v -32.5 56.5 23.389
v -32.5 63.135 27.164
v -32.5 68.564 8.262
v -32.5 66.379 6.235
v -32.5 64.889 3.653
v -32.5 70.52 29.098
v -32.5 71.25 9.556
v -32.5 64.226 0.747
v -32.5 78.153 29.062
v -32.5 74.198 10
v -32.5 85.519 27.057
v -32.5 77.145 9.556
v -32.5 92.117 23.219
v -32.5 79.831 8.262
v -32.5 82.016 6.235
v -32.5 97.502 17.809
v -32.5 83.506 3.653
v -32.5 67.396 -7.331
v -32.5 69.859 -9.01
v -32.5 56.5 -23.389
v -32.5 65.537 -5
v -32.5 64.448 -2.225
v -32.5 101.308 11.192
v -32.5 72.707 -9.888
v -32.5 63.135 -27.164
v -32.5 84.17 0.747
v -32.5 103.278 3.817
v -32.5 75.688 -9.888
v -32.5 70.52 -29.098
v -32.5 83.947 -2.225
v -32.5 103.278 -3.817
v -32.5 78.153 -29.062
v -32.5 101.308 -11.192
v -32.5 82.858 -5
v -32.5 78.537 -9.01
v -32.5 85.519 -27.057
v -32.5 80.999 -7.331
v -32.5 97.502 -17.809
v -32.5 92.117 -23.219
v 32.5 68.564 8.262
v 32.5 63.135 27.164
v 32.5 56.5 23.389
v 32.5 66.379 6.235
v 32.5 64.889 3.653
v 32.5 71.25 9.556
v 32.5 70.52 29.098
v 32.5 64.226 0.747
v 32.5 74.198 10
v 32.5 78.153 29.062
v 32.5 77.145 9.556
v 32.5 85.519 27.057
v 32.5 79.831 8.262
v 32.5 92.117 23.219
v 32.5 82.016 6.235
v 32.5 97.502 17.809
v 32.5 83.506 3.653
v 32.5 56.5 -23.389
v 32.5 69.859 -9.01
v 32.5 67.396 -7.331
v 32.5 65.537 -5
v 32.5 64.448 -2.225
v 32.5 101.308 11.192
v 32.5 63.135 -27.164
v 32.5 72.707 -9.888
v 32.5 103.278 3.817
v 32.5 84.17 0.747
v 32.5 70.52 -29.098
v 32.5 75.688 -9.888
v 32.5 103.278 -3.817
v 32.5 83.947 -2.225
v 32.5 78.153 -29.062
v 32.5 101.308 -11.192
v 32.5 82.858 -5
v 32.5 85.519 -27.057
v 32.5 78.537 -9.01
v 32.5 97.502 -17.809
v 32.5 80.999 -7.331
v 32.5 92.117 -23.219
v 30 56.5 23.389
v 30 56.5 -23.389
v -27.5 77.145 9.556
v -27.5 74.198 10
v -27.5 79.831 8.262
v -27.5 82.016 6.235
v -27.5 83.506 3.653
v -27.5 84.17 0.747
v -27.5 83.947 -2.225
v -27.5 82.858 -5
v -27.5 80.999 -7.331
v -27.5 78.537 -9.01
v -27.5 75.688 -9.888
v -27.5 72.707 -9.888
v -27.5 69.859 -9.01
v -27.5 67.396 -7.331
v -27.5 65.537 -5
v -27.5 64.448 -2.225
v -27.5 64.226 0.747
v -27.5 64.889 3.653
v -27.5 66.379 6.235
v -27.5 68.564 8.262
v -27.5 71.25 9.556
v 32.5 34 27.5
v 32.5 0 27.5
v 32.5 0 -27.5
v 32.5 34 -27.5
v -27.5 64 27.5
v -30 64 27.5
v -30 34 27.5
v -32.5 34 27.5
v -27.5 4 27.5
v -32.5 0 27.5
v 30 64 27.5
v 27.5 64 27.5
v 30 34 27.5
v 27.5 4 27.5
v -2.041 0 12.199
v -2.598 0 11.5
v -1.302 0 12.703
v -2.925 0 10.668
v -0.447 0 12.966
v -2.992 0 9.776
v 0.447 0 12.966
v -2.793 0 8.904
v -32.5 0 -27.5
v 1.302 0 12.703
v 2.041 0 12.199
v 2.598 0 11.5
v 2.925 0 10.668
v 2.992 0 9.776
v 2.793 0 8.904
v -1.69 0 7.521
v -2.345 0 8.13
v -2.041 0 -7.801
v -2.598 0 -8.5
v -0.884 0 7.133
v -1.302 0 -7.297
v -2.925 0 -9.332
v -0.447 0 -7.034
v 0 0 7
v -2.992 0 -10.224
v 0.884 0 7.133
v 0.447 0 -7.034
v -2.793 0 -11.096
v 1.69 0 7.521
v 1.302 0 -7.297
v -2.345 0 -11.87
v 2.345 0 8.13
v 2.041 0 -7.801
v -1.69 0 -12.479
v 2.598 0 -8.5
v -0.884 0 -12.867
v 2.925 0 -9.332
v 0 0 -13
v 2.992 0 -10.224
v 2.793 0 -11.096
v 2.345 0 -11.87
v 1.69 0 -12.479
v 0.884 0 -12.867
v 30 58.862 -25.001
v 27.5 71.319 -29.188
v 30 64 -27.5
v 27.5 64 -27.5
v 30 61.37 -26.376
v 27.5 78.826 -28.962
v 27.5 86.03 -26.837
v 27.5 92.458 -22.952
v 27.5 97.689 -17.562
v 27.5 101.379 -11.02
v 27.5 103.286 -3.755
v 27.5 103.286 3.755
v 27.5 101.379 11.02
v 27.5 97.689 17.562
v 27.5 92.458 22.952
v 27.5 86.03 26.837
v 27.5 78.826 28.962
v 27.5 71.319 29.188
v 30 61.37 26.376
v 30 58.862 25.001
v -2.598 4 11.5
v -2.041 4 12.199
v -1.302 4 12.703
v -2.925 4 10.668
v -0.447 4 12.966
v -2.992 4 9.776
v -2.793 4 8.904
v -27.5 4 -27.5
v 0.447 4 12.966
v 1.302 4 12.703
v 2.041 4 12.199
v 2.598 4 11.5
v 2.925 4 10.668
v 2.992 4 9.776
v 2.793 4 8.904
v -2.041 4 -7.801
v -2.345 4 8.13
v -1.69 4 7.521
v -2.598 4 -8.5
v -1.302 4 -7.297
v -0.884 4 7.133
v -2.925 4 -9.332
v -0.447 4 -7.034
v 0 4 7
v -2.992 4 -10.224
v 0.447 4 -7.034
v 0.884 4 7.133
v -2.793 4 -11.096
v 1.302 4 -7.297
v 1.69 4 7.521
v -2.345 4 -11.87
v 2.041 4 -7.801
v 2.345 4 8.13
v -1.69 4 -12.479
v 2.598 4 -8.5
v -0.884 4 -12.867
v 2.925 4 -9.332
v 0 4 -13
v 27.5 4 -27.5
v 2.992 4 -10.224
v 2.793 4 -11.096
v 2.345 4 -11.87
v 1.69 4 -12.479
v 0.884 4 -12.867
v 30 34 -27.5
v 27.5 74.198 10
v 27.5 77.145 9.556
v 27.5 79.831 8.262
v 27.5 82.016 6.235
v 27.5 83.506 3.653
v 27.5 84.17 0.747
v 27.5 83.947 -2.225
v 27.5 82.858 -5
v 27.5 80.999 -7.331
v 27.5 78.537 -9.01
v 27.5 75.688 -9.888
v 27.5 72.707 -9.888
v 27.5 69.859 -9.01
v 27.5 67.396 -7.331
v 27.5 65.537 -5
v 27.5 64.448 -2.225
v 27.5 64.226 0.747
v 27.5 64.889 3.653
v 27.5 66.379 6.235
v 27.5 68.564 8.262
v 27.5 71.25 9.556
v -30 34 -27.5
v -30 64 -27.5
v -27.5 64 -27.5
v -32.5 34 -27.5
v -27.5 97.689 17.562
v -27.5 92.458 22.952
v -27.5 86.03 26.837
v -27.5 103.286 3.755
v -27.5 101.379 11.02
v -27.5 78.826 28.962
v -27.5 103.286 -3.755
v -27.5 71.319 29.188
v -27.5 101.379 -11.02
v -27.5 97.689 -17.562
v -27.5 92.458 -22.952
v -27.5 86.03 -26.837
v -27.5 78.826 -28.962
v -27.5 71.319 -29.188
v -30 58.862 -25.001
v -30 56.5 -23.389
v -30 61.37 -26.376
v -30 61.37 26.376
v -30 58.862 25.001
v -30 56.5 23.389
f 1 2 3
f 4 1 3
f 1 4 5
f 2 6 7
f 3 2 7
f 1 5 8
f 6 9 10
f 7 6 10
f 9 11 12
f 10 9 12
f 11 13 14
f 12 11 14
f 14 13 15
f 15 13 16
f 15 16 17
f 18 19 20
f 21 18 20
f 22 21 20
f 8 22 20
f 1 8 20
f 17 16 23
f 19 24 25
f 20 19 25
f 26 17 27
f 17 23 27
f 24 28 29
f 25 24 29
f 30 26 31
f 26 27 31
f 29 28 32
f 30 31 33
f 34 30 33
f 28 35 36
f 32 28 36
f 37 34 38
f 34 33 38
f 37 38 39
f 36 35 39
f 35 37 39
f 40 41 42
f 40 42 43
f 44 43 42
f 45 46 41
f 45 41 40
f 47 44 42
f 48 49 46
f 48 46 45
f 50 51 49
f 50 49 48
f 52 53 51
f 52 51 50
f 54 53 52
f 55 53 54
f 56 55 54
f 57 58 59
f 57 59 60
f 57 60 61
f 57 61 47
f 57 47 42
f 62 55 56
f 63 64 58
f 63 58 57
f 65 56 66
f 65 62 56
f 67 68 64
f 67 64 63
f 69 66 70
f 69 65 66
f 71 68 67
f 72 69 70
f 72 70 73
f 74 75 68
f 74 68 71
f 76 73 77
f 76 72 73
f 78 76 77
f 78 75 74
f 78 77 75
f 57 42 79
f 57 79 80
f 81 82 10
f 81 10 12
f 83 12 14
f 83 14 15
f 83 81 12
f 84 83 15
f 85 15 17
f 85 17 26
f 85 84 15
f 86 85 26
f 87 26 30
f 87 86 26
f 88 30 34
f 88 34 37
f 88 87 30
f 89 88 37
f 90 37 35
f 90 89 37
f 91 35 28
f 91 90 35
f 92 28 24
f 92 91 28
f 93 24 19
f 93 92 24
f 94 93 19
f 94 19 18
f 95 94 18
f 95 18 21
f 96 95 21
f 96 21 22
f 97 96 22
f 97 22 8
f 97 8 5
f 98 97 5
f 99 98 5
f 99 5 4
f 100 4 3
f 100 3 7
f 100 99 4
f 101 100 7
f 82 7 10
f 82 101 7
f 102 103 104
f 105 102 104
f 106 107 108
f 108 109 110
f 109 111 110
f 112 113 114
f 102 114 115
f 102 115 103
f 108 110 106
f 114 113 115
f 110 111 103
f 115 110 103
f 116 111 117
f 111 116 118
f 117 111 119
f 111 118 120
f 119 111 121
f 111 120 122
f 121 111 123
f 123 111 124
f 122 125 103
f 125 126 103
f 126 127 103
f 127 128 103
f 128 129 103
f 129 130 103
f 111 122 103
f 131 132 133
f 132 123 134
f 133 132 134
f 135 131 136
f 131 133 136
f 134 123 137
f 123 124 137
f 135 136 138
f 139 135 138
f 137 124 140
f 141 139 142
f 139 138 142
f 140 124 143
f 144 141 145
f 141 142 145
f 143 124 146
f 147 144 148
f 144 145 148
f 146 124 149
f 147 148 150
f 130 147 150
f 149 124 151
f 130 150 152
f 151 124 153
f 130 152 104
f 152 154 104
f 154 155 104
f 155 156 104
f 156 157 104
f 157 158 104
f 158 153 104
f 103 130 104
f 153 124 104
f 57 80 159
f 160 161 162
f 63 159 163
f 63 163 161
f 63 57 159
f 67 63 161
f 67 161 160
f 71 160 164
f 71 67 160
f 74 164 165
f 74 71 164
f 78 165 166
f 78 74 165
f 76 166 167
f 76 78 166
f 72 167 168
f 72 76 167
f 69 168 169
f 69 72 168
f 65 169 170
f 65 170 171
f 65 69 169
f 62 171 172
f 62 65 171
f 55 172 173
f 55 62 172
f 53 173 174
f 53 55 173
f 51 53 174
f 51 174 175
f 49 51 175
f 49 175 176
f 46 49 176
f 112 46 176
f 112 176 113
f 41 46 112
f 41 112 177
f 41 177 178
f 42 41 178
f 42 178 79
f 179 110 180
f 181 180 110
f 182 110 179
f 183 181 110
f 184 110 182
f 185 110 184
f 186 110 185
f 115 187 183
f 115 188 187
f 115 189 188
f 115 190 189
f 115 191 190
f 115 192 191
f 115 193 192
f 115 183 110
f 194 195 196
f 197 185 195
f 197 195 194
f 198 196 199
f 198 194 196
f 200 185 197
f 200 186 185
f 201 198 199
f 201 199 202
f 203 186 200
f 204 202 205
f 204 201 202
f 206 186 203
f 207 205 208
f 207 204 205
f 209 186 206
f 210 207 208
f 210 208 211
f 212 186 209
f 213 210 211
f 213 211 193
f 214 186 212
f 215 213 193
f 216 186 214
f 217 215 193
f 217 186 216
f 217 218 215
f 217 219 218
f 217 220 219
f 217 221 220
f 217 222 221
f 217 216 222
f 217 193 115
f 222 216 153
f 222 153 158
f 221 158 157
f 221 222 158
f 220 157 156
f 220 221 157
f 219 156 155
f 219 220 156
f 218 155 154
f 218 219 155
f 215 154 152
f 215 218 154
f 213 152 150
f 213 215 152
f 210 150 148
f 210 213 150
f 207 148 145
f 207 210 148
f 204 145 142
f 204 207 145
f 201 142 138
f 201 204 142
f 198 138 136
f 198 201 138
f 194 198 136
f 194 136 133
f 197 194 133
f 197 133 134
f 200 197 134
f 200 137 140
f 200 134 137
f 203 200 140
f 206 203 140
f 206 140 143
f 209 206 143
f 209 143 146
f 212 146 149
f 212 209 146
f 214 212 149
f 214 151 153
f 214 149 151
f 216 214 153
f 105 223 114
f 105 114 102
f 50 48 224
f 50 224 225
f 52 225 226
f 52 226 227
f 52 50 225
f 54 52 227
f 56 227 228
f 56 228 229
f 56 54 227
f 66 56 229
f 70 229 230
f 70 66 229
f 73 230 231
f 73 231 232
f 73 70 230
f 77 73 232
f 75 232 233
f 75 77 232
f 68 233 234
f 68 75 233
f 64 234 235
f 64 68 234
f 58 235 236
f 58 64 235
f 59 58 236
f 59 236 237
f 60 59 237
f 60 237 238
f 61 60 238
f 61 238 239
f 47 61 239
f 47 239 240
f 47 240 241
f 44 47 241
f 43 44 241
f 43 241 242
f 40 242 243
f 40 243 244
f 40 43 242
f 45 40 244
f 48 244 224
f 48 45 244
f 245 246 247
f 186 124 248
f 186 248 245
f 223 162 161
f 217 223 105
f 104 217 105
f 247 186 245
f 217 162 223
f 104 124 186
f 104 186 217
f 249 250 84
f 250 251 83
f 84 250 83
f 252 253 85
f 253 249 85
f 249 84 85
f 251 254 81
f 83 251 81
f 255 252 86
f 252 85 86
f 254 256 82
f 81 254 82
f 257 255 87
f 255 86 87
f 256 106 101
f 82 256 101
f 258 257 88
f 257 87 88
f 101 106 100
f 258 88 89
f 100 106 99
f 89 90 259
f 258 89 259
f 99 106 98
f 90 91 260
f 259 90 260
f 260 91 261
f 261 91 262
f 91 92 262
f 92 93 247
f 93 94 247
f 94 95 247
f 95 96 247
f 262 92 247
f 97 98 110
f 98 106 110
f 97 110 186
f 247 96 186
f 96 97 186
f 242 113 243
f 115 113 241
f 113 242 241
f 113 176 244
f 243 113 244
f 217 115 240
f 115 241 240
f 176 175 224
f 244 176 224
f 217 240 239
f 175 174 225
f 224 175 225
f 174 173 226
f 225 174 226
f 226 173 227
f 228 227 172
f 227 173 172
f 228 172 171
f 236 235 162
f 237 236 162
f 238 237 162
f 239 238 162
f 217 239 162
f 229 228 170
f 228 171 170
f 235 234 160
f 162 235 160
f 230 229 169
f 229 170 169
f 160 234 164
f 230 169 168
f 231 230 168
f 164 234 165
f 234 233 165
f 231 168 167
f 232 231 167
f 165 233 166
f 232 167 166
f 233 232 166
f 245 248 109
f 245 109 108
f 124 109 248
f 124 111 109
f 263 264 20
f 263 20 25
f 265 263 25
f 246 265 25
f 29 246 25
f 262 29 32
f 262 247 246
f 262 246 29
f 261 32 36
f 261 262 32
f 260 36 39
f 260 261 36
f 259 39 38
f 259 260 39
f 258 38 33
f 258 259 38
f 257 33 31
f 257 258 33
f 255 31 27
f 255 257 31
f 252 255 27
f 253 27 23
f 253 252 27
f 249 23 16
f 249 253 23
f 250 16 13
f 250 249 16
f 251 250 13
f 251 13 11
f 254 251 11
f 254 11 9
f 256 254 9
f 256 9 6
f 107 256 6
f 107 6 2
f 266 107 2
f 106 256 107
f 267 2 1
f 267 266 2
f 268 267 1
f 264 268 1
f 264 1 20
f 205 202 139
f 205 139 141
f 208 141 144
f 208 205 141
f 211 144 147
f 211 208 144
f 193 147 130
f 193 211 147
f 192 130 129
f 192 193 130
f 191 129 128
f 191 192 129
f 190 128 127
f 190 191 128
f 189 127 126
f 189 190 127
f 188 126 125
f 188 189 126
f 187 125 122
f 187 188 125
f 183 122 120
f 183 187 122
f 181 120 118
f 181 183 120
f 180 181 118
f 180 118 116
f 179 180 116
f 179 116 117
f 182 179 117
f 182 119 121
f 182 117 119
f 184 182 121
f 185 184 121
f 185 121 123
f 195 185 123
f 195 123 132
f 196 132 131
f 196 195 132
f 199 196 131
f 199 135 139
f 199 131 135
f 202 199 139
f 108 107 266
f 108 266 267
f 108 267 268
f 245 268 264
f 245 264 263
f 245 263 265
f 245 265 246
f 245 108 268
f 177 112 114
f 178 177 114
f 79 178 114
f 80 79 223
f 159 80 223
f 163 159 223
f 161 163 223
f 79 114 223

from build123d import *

# Parameters (mm, degrees)
SKETCH1_W                = 65
SKETCH1_H                = 55
BOSS_EXTRUDE1_DEPTH      = 4
SKETCH2_W                = 2.5
SKETCH2_H                = 55
BOSS_EXTRUDE2_DEPTH      = 60
SKETCH2_3_W              = 2.5
SKETCH2_3_H              = 55
BOSS_EXTRUDE3_DEPTH      = 30
BOSS_EXTRUDE4_DEPTH      = 2.5
BOSS_EXTRUDE4_DEPTH_BACK = 2.5
SKETCH4_R                = 10
BOSS_EXTRUDE5_START      = -62.5
SKETCH4_2_R              = 10
BOSS_EXTRUDE5_DEPTH      = 5
CUT_EXTRUDE1_DEPTH       = 113.403083271
CUT_EXTRUDE1_DEPTH_BACK  = 113.403083271
SKETCH5_R                = 3


with BuildPart() as part:
    # Sketch1 → Boss-Extrude1 (new body)
    with BuildSketch(Plane(origin=(0, 0, 0), x_dir=(1, 0, 0), z_dir=(0, 1, 0))):
        Rectangle(SKETCH1_W, SKETCH1_H)
    extrude(amount=BOSS_EXTRUDE1_DEPTH)

    # Sketch2 → Boss-Extrude2 (add)
    with BuildSketch(Plane(origin=(0, 4, 0), x_dir=(1, 0, 0), z_dir=(0, 1, 0))):
        with Locations((-28.75, 0)):
            Rectangle(SKETCH2_W, SKETCH2_H)
        with Locations((28.75, 0)):
            Rectangle(SKETCH2_W, SKETCH2_H)
    extrude(amount=BOSS_EXTRUDE2_DEPTH)

    # Sketch2<3> → Boss-Extrude3 (add)
    with BuildSketch(Plane(origin=(0, 4, 0), x_dir=(1, 0, 0), z_dir=(0, 1, 0))):
        with Locations((-31.25, 0)):
            Rectangle(SKETCH2_3_W, SKETCH2_3_H)
        with Locations((31.25, 0)):
            Rectangle(SKETCH2_3_W, SKETCH2_3_H)
    extrude(amount=BOSS_EXTRUDE3_DEPTH)

    # Sketch4 → Boss-Extrude4 (add, two sides: drawn at the far end of the back side and taken through both)
    with BuildSketch(Plane.ZY.offset(30).offset(-BOSS_EXTRUDE4_DEPTH_BACK)):
        with BuildLine():
            Line((23.388987302, 56.500283138), (-23.388987302, 56.500283138))
            ThreePointArc((-23.388987302, 56.500283138), (0, 103.527582425), (23.388987302, 56.500283138))
        make_face()
        with Locations((0, 74.19768631)):
            Circle(SKETCH4_R, mode=Mode.SUBTRACT)
    extrude(amount=BOSS_EXTRUDE4_DEPTH + BOSS_EXTRUDE4_DEPTH_BACK)

    # Sketch4<2> → Boss-Extrude5 (add)
    with BuildSketch(Plane.ZY.offset(30).offset(BOSS_EXTRUDE5_START)):
        with BuildLine():
            Line((23.388987302, 56.500283138), (-23.388987302, 56.500283138))
            ThreePointArc((-23.388987302, 56.500283138), (0, 103.527582425), (23.388987302, 56.500283138))
        make_face()
        with Locations((0, 74.19768631)):
            Circle(SKETCH4_2_R, mode=Mode.SUBTRACT)
    extrude(amount=BOSS_EXTRUDE5_DEPTH)

    # Sketch5 → Cut-Extrude1 (cut, two sides: drawn at the far end of the back side and taken through both)
    with BuildSketch(Plane.XZ.offset(-CUT_EXTRUDE1_DEPTH_BACK)):
        with Locations((0, 10)):
            Circle(SKETCH5_R)
        with Locations((0, -10)):
            Circle(SKETCH5_R)
    extrude(amount=CUT_EXTRUDE1_DEPTH + CUT_EXTRUDE1_DEPTH_BACK, mode=Mode.SUBTRACT)


solid = part.part
